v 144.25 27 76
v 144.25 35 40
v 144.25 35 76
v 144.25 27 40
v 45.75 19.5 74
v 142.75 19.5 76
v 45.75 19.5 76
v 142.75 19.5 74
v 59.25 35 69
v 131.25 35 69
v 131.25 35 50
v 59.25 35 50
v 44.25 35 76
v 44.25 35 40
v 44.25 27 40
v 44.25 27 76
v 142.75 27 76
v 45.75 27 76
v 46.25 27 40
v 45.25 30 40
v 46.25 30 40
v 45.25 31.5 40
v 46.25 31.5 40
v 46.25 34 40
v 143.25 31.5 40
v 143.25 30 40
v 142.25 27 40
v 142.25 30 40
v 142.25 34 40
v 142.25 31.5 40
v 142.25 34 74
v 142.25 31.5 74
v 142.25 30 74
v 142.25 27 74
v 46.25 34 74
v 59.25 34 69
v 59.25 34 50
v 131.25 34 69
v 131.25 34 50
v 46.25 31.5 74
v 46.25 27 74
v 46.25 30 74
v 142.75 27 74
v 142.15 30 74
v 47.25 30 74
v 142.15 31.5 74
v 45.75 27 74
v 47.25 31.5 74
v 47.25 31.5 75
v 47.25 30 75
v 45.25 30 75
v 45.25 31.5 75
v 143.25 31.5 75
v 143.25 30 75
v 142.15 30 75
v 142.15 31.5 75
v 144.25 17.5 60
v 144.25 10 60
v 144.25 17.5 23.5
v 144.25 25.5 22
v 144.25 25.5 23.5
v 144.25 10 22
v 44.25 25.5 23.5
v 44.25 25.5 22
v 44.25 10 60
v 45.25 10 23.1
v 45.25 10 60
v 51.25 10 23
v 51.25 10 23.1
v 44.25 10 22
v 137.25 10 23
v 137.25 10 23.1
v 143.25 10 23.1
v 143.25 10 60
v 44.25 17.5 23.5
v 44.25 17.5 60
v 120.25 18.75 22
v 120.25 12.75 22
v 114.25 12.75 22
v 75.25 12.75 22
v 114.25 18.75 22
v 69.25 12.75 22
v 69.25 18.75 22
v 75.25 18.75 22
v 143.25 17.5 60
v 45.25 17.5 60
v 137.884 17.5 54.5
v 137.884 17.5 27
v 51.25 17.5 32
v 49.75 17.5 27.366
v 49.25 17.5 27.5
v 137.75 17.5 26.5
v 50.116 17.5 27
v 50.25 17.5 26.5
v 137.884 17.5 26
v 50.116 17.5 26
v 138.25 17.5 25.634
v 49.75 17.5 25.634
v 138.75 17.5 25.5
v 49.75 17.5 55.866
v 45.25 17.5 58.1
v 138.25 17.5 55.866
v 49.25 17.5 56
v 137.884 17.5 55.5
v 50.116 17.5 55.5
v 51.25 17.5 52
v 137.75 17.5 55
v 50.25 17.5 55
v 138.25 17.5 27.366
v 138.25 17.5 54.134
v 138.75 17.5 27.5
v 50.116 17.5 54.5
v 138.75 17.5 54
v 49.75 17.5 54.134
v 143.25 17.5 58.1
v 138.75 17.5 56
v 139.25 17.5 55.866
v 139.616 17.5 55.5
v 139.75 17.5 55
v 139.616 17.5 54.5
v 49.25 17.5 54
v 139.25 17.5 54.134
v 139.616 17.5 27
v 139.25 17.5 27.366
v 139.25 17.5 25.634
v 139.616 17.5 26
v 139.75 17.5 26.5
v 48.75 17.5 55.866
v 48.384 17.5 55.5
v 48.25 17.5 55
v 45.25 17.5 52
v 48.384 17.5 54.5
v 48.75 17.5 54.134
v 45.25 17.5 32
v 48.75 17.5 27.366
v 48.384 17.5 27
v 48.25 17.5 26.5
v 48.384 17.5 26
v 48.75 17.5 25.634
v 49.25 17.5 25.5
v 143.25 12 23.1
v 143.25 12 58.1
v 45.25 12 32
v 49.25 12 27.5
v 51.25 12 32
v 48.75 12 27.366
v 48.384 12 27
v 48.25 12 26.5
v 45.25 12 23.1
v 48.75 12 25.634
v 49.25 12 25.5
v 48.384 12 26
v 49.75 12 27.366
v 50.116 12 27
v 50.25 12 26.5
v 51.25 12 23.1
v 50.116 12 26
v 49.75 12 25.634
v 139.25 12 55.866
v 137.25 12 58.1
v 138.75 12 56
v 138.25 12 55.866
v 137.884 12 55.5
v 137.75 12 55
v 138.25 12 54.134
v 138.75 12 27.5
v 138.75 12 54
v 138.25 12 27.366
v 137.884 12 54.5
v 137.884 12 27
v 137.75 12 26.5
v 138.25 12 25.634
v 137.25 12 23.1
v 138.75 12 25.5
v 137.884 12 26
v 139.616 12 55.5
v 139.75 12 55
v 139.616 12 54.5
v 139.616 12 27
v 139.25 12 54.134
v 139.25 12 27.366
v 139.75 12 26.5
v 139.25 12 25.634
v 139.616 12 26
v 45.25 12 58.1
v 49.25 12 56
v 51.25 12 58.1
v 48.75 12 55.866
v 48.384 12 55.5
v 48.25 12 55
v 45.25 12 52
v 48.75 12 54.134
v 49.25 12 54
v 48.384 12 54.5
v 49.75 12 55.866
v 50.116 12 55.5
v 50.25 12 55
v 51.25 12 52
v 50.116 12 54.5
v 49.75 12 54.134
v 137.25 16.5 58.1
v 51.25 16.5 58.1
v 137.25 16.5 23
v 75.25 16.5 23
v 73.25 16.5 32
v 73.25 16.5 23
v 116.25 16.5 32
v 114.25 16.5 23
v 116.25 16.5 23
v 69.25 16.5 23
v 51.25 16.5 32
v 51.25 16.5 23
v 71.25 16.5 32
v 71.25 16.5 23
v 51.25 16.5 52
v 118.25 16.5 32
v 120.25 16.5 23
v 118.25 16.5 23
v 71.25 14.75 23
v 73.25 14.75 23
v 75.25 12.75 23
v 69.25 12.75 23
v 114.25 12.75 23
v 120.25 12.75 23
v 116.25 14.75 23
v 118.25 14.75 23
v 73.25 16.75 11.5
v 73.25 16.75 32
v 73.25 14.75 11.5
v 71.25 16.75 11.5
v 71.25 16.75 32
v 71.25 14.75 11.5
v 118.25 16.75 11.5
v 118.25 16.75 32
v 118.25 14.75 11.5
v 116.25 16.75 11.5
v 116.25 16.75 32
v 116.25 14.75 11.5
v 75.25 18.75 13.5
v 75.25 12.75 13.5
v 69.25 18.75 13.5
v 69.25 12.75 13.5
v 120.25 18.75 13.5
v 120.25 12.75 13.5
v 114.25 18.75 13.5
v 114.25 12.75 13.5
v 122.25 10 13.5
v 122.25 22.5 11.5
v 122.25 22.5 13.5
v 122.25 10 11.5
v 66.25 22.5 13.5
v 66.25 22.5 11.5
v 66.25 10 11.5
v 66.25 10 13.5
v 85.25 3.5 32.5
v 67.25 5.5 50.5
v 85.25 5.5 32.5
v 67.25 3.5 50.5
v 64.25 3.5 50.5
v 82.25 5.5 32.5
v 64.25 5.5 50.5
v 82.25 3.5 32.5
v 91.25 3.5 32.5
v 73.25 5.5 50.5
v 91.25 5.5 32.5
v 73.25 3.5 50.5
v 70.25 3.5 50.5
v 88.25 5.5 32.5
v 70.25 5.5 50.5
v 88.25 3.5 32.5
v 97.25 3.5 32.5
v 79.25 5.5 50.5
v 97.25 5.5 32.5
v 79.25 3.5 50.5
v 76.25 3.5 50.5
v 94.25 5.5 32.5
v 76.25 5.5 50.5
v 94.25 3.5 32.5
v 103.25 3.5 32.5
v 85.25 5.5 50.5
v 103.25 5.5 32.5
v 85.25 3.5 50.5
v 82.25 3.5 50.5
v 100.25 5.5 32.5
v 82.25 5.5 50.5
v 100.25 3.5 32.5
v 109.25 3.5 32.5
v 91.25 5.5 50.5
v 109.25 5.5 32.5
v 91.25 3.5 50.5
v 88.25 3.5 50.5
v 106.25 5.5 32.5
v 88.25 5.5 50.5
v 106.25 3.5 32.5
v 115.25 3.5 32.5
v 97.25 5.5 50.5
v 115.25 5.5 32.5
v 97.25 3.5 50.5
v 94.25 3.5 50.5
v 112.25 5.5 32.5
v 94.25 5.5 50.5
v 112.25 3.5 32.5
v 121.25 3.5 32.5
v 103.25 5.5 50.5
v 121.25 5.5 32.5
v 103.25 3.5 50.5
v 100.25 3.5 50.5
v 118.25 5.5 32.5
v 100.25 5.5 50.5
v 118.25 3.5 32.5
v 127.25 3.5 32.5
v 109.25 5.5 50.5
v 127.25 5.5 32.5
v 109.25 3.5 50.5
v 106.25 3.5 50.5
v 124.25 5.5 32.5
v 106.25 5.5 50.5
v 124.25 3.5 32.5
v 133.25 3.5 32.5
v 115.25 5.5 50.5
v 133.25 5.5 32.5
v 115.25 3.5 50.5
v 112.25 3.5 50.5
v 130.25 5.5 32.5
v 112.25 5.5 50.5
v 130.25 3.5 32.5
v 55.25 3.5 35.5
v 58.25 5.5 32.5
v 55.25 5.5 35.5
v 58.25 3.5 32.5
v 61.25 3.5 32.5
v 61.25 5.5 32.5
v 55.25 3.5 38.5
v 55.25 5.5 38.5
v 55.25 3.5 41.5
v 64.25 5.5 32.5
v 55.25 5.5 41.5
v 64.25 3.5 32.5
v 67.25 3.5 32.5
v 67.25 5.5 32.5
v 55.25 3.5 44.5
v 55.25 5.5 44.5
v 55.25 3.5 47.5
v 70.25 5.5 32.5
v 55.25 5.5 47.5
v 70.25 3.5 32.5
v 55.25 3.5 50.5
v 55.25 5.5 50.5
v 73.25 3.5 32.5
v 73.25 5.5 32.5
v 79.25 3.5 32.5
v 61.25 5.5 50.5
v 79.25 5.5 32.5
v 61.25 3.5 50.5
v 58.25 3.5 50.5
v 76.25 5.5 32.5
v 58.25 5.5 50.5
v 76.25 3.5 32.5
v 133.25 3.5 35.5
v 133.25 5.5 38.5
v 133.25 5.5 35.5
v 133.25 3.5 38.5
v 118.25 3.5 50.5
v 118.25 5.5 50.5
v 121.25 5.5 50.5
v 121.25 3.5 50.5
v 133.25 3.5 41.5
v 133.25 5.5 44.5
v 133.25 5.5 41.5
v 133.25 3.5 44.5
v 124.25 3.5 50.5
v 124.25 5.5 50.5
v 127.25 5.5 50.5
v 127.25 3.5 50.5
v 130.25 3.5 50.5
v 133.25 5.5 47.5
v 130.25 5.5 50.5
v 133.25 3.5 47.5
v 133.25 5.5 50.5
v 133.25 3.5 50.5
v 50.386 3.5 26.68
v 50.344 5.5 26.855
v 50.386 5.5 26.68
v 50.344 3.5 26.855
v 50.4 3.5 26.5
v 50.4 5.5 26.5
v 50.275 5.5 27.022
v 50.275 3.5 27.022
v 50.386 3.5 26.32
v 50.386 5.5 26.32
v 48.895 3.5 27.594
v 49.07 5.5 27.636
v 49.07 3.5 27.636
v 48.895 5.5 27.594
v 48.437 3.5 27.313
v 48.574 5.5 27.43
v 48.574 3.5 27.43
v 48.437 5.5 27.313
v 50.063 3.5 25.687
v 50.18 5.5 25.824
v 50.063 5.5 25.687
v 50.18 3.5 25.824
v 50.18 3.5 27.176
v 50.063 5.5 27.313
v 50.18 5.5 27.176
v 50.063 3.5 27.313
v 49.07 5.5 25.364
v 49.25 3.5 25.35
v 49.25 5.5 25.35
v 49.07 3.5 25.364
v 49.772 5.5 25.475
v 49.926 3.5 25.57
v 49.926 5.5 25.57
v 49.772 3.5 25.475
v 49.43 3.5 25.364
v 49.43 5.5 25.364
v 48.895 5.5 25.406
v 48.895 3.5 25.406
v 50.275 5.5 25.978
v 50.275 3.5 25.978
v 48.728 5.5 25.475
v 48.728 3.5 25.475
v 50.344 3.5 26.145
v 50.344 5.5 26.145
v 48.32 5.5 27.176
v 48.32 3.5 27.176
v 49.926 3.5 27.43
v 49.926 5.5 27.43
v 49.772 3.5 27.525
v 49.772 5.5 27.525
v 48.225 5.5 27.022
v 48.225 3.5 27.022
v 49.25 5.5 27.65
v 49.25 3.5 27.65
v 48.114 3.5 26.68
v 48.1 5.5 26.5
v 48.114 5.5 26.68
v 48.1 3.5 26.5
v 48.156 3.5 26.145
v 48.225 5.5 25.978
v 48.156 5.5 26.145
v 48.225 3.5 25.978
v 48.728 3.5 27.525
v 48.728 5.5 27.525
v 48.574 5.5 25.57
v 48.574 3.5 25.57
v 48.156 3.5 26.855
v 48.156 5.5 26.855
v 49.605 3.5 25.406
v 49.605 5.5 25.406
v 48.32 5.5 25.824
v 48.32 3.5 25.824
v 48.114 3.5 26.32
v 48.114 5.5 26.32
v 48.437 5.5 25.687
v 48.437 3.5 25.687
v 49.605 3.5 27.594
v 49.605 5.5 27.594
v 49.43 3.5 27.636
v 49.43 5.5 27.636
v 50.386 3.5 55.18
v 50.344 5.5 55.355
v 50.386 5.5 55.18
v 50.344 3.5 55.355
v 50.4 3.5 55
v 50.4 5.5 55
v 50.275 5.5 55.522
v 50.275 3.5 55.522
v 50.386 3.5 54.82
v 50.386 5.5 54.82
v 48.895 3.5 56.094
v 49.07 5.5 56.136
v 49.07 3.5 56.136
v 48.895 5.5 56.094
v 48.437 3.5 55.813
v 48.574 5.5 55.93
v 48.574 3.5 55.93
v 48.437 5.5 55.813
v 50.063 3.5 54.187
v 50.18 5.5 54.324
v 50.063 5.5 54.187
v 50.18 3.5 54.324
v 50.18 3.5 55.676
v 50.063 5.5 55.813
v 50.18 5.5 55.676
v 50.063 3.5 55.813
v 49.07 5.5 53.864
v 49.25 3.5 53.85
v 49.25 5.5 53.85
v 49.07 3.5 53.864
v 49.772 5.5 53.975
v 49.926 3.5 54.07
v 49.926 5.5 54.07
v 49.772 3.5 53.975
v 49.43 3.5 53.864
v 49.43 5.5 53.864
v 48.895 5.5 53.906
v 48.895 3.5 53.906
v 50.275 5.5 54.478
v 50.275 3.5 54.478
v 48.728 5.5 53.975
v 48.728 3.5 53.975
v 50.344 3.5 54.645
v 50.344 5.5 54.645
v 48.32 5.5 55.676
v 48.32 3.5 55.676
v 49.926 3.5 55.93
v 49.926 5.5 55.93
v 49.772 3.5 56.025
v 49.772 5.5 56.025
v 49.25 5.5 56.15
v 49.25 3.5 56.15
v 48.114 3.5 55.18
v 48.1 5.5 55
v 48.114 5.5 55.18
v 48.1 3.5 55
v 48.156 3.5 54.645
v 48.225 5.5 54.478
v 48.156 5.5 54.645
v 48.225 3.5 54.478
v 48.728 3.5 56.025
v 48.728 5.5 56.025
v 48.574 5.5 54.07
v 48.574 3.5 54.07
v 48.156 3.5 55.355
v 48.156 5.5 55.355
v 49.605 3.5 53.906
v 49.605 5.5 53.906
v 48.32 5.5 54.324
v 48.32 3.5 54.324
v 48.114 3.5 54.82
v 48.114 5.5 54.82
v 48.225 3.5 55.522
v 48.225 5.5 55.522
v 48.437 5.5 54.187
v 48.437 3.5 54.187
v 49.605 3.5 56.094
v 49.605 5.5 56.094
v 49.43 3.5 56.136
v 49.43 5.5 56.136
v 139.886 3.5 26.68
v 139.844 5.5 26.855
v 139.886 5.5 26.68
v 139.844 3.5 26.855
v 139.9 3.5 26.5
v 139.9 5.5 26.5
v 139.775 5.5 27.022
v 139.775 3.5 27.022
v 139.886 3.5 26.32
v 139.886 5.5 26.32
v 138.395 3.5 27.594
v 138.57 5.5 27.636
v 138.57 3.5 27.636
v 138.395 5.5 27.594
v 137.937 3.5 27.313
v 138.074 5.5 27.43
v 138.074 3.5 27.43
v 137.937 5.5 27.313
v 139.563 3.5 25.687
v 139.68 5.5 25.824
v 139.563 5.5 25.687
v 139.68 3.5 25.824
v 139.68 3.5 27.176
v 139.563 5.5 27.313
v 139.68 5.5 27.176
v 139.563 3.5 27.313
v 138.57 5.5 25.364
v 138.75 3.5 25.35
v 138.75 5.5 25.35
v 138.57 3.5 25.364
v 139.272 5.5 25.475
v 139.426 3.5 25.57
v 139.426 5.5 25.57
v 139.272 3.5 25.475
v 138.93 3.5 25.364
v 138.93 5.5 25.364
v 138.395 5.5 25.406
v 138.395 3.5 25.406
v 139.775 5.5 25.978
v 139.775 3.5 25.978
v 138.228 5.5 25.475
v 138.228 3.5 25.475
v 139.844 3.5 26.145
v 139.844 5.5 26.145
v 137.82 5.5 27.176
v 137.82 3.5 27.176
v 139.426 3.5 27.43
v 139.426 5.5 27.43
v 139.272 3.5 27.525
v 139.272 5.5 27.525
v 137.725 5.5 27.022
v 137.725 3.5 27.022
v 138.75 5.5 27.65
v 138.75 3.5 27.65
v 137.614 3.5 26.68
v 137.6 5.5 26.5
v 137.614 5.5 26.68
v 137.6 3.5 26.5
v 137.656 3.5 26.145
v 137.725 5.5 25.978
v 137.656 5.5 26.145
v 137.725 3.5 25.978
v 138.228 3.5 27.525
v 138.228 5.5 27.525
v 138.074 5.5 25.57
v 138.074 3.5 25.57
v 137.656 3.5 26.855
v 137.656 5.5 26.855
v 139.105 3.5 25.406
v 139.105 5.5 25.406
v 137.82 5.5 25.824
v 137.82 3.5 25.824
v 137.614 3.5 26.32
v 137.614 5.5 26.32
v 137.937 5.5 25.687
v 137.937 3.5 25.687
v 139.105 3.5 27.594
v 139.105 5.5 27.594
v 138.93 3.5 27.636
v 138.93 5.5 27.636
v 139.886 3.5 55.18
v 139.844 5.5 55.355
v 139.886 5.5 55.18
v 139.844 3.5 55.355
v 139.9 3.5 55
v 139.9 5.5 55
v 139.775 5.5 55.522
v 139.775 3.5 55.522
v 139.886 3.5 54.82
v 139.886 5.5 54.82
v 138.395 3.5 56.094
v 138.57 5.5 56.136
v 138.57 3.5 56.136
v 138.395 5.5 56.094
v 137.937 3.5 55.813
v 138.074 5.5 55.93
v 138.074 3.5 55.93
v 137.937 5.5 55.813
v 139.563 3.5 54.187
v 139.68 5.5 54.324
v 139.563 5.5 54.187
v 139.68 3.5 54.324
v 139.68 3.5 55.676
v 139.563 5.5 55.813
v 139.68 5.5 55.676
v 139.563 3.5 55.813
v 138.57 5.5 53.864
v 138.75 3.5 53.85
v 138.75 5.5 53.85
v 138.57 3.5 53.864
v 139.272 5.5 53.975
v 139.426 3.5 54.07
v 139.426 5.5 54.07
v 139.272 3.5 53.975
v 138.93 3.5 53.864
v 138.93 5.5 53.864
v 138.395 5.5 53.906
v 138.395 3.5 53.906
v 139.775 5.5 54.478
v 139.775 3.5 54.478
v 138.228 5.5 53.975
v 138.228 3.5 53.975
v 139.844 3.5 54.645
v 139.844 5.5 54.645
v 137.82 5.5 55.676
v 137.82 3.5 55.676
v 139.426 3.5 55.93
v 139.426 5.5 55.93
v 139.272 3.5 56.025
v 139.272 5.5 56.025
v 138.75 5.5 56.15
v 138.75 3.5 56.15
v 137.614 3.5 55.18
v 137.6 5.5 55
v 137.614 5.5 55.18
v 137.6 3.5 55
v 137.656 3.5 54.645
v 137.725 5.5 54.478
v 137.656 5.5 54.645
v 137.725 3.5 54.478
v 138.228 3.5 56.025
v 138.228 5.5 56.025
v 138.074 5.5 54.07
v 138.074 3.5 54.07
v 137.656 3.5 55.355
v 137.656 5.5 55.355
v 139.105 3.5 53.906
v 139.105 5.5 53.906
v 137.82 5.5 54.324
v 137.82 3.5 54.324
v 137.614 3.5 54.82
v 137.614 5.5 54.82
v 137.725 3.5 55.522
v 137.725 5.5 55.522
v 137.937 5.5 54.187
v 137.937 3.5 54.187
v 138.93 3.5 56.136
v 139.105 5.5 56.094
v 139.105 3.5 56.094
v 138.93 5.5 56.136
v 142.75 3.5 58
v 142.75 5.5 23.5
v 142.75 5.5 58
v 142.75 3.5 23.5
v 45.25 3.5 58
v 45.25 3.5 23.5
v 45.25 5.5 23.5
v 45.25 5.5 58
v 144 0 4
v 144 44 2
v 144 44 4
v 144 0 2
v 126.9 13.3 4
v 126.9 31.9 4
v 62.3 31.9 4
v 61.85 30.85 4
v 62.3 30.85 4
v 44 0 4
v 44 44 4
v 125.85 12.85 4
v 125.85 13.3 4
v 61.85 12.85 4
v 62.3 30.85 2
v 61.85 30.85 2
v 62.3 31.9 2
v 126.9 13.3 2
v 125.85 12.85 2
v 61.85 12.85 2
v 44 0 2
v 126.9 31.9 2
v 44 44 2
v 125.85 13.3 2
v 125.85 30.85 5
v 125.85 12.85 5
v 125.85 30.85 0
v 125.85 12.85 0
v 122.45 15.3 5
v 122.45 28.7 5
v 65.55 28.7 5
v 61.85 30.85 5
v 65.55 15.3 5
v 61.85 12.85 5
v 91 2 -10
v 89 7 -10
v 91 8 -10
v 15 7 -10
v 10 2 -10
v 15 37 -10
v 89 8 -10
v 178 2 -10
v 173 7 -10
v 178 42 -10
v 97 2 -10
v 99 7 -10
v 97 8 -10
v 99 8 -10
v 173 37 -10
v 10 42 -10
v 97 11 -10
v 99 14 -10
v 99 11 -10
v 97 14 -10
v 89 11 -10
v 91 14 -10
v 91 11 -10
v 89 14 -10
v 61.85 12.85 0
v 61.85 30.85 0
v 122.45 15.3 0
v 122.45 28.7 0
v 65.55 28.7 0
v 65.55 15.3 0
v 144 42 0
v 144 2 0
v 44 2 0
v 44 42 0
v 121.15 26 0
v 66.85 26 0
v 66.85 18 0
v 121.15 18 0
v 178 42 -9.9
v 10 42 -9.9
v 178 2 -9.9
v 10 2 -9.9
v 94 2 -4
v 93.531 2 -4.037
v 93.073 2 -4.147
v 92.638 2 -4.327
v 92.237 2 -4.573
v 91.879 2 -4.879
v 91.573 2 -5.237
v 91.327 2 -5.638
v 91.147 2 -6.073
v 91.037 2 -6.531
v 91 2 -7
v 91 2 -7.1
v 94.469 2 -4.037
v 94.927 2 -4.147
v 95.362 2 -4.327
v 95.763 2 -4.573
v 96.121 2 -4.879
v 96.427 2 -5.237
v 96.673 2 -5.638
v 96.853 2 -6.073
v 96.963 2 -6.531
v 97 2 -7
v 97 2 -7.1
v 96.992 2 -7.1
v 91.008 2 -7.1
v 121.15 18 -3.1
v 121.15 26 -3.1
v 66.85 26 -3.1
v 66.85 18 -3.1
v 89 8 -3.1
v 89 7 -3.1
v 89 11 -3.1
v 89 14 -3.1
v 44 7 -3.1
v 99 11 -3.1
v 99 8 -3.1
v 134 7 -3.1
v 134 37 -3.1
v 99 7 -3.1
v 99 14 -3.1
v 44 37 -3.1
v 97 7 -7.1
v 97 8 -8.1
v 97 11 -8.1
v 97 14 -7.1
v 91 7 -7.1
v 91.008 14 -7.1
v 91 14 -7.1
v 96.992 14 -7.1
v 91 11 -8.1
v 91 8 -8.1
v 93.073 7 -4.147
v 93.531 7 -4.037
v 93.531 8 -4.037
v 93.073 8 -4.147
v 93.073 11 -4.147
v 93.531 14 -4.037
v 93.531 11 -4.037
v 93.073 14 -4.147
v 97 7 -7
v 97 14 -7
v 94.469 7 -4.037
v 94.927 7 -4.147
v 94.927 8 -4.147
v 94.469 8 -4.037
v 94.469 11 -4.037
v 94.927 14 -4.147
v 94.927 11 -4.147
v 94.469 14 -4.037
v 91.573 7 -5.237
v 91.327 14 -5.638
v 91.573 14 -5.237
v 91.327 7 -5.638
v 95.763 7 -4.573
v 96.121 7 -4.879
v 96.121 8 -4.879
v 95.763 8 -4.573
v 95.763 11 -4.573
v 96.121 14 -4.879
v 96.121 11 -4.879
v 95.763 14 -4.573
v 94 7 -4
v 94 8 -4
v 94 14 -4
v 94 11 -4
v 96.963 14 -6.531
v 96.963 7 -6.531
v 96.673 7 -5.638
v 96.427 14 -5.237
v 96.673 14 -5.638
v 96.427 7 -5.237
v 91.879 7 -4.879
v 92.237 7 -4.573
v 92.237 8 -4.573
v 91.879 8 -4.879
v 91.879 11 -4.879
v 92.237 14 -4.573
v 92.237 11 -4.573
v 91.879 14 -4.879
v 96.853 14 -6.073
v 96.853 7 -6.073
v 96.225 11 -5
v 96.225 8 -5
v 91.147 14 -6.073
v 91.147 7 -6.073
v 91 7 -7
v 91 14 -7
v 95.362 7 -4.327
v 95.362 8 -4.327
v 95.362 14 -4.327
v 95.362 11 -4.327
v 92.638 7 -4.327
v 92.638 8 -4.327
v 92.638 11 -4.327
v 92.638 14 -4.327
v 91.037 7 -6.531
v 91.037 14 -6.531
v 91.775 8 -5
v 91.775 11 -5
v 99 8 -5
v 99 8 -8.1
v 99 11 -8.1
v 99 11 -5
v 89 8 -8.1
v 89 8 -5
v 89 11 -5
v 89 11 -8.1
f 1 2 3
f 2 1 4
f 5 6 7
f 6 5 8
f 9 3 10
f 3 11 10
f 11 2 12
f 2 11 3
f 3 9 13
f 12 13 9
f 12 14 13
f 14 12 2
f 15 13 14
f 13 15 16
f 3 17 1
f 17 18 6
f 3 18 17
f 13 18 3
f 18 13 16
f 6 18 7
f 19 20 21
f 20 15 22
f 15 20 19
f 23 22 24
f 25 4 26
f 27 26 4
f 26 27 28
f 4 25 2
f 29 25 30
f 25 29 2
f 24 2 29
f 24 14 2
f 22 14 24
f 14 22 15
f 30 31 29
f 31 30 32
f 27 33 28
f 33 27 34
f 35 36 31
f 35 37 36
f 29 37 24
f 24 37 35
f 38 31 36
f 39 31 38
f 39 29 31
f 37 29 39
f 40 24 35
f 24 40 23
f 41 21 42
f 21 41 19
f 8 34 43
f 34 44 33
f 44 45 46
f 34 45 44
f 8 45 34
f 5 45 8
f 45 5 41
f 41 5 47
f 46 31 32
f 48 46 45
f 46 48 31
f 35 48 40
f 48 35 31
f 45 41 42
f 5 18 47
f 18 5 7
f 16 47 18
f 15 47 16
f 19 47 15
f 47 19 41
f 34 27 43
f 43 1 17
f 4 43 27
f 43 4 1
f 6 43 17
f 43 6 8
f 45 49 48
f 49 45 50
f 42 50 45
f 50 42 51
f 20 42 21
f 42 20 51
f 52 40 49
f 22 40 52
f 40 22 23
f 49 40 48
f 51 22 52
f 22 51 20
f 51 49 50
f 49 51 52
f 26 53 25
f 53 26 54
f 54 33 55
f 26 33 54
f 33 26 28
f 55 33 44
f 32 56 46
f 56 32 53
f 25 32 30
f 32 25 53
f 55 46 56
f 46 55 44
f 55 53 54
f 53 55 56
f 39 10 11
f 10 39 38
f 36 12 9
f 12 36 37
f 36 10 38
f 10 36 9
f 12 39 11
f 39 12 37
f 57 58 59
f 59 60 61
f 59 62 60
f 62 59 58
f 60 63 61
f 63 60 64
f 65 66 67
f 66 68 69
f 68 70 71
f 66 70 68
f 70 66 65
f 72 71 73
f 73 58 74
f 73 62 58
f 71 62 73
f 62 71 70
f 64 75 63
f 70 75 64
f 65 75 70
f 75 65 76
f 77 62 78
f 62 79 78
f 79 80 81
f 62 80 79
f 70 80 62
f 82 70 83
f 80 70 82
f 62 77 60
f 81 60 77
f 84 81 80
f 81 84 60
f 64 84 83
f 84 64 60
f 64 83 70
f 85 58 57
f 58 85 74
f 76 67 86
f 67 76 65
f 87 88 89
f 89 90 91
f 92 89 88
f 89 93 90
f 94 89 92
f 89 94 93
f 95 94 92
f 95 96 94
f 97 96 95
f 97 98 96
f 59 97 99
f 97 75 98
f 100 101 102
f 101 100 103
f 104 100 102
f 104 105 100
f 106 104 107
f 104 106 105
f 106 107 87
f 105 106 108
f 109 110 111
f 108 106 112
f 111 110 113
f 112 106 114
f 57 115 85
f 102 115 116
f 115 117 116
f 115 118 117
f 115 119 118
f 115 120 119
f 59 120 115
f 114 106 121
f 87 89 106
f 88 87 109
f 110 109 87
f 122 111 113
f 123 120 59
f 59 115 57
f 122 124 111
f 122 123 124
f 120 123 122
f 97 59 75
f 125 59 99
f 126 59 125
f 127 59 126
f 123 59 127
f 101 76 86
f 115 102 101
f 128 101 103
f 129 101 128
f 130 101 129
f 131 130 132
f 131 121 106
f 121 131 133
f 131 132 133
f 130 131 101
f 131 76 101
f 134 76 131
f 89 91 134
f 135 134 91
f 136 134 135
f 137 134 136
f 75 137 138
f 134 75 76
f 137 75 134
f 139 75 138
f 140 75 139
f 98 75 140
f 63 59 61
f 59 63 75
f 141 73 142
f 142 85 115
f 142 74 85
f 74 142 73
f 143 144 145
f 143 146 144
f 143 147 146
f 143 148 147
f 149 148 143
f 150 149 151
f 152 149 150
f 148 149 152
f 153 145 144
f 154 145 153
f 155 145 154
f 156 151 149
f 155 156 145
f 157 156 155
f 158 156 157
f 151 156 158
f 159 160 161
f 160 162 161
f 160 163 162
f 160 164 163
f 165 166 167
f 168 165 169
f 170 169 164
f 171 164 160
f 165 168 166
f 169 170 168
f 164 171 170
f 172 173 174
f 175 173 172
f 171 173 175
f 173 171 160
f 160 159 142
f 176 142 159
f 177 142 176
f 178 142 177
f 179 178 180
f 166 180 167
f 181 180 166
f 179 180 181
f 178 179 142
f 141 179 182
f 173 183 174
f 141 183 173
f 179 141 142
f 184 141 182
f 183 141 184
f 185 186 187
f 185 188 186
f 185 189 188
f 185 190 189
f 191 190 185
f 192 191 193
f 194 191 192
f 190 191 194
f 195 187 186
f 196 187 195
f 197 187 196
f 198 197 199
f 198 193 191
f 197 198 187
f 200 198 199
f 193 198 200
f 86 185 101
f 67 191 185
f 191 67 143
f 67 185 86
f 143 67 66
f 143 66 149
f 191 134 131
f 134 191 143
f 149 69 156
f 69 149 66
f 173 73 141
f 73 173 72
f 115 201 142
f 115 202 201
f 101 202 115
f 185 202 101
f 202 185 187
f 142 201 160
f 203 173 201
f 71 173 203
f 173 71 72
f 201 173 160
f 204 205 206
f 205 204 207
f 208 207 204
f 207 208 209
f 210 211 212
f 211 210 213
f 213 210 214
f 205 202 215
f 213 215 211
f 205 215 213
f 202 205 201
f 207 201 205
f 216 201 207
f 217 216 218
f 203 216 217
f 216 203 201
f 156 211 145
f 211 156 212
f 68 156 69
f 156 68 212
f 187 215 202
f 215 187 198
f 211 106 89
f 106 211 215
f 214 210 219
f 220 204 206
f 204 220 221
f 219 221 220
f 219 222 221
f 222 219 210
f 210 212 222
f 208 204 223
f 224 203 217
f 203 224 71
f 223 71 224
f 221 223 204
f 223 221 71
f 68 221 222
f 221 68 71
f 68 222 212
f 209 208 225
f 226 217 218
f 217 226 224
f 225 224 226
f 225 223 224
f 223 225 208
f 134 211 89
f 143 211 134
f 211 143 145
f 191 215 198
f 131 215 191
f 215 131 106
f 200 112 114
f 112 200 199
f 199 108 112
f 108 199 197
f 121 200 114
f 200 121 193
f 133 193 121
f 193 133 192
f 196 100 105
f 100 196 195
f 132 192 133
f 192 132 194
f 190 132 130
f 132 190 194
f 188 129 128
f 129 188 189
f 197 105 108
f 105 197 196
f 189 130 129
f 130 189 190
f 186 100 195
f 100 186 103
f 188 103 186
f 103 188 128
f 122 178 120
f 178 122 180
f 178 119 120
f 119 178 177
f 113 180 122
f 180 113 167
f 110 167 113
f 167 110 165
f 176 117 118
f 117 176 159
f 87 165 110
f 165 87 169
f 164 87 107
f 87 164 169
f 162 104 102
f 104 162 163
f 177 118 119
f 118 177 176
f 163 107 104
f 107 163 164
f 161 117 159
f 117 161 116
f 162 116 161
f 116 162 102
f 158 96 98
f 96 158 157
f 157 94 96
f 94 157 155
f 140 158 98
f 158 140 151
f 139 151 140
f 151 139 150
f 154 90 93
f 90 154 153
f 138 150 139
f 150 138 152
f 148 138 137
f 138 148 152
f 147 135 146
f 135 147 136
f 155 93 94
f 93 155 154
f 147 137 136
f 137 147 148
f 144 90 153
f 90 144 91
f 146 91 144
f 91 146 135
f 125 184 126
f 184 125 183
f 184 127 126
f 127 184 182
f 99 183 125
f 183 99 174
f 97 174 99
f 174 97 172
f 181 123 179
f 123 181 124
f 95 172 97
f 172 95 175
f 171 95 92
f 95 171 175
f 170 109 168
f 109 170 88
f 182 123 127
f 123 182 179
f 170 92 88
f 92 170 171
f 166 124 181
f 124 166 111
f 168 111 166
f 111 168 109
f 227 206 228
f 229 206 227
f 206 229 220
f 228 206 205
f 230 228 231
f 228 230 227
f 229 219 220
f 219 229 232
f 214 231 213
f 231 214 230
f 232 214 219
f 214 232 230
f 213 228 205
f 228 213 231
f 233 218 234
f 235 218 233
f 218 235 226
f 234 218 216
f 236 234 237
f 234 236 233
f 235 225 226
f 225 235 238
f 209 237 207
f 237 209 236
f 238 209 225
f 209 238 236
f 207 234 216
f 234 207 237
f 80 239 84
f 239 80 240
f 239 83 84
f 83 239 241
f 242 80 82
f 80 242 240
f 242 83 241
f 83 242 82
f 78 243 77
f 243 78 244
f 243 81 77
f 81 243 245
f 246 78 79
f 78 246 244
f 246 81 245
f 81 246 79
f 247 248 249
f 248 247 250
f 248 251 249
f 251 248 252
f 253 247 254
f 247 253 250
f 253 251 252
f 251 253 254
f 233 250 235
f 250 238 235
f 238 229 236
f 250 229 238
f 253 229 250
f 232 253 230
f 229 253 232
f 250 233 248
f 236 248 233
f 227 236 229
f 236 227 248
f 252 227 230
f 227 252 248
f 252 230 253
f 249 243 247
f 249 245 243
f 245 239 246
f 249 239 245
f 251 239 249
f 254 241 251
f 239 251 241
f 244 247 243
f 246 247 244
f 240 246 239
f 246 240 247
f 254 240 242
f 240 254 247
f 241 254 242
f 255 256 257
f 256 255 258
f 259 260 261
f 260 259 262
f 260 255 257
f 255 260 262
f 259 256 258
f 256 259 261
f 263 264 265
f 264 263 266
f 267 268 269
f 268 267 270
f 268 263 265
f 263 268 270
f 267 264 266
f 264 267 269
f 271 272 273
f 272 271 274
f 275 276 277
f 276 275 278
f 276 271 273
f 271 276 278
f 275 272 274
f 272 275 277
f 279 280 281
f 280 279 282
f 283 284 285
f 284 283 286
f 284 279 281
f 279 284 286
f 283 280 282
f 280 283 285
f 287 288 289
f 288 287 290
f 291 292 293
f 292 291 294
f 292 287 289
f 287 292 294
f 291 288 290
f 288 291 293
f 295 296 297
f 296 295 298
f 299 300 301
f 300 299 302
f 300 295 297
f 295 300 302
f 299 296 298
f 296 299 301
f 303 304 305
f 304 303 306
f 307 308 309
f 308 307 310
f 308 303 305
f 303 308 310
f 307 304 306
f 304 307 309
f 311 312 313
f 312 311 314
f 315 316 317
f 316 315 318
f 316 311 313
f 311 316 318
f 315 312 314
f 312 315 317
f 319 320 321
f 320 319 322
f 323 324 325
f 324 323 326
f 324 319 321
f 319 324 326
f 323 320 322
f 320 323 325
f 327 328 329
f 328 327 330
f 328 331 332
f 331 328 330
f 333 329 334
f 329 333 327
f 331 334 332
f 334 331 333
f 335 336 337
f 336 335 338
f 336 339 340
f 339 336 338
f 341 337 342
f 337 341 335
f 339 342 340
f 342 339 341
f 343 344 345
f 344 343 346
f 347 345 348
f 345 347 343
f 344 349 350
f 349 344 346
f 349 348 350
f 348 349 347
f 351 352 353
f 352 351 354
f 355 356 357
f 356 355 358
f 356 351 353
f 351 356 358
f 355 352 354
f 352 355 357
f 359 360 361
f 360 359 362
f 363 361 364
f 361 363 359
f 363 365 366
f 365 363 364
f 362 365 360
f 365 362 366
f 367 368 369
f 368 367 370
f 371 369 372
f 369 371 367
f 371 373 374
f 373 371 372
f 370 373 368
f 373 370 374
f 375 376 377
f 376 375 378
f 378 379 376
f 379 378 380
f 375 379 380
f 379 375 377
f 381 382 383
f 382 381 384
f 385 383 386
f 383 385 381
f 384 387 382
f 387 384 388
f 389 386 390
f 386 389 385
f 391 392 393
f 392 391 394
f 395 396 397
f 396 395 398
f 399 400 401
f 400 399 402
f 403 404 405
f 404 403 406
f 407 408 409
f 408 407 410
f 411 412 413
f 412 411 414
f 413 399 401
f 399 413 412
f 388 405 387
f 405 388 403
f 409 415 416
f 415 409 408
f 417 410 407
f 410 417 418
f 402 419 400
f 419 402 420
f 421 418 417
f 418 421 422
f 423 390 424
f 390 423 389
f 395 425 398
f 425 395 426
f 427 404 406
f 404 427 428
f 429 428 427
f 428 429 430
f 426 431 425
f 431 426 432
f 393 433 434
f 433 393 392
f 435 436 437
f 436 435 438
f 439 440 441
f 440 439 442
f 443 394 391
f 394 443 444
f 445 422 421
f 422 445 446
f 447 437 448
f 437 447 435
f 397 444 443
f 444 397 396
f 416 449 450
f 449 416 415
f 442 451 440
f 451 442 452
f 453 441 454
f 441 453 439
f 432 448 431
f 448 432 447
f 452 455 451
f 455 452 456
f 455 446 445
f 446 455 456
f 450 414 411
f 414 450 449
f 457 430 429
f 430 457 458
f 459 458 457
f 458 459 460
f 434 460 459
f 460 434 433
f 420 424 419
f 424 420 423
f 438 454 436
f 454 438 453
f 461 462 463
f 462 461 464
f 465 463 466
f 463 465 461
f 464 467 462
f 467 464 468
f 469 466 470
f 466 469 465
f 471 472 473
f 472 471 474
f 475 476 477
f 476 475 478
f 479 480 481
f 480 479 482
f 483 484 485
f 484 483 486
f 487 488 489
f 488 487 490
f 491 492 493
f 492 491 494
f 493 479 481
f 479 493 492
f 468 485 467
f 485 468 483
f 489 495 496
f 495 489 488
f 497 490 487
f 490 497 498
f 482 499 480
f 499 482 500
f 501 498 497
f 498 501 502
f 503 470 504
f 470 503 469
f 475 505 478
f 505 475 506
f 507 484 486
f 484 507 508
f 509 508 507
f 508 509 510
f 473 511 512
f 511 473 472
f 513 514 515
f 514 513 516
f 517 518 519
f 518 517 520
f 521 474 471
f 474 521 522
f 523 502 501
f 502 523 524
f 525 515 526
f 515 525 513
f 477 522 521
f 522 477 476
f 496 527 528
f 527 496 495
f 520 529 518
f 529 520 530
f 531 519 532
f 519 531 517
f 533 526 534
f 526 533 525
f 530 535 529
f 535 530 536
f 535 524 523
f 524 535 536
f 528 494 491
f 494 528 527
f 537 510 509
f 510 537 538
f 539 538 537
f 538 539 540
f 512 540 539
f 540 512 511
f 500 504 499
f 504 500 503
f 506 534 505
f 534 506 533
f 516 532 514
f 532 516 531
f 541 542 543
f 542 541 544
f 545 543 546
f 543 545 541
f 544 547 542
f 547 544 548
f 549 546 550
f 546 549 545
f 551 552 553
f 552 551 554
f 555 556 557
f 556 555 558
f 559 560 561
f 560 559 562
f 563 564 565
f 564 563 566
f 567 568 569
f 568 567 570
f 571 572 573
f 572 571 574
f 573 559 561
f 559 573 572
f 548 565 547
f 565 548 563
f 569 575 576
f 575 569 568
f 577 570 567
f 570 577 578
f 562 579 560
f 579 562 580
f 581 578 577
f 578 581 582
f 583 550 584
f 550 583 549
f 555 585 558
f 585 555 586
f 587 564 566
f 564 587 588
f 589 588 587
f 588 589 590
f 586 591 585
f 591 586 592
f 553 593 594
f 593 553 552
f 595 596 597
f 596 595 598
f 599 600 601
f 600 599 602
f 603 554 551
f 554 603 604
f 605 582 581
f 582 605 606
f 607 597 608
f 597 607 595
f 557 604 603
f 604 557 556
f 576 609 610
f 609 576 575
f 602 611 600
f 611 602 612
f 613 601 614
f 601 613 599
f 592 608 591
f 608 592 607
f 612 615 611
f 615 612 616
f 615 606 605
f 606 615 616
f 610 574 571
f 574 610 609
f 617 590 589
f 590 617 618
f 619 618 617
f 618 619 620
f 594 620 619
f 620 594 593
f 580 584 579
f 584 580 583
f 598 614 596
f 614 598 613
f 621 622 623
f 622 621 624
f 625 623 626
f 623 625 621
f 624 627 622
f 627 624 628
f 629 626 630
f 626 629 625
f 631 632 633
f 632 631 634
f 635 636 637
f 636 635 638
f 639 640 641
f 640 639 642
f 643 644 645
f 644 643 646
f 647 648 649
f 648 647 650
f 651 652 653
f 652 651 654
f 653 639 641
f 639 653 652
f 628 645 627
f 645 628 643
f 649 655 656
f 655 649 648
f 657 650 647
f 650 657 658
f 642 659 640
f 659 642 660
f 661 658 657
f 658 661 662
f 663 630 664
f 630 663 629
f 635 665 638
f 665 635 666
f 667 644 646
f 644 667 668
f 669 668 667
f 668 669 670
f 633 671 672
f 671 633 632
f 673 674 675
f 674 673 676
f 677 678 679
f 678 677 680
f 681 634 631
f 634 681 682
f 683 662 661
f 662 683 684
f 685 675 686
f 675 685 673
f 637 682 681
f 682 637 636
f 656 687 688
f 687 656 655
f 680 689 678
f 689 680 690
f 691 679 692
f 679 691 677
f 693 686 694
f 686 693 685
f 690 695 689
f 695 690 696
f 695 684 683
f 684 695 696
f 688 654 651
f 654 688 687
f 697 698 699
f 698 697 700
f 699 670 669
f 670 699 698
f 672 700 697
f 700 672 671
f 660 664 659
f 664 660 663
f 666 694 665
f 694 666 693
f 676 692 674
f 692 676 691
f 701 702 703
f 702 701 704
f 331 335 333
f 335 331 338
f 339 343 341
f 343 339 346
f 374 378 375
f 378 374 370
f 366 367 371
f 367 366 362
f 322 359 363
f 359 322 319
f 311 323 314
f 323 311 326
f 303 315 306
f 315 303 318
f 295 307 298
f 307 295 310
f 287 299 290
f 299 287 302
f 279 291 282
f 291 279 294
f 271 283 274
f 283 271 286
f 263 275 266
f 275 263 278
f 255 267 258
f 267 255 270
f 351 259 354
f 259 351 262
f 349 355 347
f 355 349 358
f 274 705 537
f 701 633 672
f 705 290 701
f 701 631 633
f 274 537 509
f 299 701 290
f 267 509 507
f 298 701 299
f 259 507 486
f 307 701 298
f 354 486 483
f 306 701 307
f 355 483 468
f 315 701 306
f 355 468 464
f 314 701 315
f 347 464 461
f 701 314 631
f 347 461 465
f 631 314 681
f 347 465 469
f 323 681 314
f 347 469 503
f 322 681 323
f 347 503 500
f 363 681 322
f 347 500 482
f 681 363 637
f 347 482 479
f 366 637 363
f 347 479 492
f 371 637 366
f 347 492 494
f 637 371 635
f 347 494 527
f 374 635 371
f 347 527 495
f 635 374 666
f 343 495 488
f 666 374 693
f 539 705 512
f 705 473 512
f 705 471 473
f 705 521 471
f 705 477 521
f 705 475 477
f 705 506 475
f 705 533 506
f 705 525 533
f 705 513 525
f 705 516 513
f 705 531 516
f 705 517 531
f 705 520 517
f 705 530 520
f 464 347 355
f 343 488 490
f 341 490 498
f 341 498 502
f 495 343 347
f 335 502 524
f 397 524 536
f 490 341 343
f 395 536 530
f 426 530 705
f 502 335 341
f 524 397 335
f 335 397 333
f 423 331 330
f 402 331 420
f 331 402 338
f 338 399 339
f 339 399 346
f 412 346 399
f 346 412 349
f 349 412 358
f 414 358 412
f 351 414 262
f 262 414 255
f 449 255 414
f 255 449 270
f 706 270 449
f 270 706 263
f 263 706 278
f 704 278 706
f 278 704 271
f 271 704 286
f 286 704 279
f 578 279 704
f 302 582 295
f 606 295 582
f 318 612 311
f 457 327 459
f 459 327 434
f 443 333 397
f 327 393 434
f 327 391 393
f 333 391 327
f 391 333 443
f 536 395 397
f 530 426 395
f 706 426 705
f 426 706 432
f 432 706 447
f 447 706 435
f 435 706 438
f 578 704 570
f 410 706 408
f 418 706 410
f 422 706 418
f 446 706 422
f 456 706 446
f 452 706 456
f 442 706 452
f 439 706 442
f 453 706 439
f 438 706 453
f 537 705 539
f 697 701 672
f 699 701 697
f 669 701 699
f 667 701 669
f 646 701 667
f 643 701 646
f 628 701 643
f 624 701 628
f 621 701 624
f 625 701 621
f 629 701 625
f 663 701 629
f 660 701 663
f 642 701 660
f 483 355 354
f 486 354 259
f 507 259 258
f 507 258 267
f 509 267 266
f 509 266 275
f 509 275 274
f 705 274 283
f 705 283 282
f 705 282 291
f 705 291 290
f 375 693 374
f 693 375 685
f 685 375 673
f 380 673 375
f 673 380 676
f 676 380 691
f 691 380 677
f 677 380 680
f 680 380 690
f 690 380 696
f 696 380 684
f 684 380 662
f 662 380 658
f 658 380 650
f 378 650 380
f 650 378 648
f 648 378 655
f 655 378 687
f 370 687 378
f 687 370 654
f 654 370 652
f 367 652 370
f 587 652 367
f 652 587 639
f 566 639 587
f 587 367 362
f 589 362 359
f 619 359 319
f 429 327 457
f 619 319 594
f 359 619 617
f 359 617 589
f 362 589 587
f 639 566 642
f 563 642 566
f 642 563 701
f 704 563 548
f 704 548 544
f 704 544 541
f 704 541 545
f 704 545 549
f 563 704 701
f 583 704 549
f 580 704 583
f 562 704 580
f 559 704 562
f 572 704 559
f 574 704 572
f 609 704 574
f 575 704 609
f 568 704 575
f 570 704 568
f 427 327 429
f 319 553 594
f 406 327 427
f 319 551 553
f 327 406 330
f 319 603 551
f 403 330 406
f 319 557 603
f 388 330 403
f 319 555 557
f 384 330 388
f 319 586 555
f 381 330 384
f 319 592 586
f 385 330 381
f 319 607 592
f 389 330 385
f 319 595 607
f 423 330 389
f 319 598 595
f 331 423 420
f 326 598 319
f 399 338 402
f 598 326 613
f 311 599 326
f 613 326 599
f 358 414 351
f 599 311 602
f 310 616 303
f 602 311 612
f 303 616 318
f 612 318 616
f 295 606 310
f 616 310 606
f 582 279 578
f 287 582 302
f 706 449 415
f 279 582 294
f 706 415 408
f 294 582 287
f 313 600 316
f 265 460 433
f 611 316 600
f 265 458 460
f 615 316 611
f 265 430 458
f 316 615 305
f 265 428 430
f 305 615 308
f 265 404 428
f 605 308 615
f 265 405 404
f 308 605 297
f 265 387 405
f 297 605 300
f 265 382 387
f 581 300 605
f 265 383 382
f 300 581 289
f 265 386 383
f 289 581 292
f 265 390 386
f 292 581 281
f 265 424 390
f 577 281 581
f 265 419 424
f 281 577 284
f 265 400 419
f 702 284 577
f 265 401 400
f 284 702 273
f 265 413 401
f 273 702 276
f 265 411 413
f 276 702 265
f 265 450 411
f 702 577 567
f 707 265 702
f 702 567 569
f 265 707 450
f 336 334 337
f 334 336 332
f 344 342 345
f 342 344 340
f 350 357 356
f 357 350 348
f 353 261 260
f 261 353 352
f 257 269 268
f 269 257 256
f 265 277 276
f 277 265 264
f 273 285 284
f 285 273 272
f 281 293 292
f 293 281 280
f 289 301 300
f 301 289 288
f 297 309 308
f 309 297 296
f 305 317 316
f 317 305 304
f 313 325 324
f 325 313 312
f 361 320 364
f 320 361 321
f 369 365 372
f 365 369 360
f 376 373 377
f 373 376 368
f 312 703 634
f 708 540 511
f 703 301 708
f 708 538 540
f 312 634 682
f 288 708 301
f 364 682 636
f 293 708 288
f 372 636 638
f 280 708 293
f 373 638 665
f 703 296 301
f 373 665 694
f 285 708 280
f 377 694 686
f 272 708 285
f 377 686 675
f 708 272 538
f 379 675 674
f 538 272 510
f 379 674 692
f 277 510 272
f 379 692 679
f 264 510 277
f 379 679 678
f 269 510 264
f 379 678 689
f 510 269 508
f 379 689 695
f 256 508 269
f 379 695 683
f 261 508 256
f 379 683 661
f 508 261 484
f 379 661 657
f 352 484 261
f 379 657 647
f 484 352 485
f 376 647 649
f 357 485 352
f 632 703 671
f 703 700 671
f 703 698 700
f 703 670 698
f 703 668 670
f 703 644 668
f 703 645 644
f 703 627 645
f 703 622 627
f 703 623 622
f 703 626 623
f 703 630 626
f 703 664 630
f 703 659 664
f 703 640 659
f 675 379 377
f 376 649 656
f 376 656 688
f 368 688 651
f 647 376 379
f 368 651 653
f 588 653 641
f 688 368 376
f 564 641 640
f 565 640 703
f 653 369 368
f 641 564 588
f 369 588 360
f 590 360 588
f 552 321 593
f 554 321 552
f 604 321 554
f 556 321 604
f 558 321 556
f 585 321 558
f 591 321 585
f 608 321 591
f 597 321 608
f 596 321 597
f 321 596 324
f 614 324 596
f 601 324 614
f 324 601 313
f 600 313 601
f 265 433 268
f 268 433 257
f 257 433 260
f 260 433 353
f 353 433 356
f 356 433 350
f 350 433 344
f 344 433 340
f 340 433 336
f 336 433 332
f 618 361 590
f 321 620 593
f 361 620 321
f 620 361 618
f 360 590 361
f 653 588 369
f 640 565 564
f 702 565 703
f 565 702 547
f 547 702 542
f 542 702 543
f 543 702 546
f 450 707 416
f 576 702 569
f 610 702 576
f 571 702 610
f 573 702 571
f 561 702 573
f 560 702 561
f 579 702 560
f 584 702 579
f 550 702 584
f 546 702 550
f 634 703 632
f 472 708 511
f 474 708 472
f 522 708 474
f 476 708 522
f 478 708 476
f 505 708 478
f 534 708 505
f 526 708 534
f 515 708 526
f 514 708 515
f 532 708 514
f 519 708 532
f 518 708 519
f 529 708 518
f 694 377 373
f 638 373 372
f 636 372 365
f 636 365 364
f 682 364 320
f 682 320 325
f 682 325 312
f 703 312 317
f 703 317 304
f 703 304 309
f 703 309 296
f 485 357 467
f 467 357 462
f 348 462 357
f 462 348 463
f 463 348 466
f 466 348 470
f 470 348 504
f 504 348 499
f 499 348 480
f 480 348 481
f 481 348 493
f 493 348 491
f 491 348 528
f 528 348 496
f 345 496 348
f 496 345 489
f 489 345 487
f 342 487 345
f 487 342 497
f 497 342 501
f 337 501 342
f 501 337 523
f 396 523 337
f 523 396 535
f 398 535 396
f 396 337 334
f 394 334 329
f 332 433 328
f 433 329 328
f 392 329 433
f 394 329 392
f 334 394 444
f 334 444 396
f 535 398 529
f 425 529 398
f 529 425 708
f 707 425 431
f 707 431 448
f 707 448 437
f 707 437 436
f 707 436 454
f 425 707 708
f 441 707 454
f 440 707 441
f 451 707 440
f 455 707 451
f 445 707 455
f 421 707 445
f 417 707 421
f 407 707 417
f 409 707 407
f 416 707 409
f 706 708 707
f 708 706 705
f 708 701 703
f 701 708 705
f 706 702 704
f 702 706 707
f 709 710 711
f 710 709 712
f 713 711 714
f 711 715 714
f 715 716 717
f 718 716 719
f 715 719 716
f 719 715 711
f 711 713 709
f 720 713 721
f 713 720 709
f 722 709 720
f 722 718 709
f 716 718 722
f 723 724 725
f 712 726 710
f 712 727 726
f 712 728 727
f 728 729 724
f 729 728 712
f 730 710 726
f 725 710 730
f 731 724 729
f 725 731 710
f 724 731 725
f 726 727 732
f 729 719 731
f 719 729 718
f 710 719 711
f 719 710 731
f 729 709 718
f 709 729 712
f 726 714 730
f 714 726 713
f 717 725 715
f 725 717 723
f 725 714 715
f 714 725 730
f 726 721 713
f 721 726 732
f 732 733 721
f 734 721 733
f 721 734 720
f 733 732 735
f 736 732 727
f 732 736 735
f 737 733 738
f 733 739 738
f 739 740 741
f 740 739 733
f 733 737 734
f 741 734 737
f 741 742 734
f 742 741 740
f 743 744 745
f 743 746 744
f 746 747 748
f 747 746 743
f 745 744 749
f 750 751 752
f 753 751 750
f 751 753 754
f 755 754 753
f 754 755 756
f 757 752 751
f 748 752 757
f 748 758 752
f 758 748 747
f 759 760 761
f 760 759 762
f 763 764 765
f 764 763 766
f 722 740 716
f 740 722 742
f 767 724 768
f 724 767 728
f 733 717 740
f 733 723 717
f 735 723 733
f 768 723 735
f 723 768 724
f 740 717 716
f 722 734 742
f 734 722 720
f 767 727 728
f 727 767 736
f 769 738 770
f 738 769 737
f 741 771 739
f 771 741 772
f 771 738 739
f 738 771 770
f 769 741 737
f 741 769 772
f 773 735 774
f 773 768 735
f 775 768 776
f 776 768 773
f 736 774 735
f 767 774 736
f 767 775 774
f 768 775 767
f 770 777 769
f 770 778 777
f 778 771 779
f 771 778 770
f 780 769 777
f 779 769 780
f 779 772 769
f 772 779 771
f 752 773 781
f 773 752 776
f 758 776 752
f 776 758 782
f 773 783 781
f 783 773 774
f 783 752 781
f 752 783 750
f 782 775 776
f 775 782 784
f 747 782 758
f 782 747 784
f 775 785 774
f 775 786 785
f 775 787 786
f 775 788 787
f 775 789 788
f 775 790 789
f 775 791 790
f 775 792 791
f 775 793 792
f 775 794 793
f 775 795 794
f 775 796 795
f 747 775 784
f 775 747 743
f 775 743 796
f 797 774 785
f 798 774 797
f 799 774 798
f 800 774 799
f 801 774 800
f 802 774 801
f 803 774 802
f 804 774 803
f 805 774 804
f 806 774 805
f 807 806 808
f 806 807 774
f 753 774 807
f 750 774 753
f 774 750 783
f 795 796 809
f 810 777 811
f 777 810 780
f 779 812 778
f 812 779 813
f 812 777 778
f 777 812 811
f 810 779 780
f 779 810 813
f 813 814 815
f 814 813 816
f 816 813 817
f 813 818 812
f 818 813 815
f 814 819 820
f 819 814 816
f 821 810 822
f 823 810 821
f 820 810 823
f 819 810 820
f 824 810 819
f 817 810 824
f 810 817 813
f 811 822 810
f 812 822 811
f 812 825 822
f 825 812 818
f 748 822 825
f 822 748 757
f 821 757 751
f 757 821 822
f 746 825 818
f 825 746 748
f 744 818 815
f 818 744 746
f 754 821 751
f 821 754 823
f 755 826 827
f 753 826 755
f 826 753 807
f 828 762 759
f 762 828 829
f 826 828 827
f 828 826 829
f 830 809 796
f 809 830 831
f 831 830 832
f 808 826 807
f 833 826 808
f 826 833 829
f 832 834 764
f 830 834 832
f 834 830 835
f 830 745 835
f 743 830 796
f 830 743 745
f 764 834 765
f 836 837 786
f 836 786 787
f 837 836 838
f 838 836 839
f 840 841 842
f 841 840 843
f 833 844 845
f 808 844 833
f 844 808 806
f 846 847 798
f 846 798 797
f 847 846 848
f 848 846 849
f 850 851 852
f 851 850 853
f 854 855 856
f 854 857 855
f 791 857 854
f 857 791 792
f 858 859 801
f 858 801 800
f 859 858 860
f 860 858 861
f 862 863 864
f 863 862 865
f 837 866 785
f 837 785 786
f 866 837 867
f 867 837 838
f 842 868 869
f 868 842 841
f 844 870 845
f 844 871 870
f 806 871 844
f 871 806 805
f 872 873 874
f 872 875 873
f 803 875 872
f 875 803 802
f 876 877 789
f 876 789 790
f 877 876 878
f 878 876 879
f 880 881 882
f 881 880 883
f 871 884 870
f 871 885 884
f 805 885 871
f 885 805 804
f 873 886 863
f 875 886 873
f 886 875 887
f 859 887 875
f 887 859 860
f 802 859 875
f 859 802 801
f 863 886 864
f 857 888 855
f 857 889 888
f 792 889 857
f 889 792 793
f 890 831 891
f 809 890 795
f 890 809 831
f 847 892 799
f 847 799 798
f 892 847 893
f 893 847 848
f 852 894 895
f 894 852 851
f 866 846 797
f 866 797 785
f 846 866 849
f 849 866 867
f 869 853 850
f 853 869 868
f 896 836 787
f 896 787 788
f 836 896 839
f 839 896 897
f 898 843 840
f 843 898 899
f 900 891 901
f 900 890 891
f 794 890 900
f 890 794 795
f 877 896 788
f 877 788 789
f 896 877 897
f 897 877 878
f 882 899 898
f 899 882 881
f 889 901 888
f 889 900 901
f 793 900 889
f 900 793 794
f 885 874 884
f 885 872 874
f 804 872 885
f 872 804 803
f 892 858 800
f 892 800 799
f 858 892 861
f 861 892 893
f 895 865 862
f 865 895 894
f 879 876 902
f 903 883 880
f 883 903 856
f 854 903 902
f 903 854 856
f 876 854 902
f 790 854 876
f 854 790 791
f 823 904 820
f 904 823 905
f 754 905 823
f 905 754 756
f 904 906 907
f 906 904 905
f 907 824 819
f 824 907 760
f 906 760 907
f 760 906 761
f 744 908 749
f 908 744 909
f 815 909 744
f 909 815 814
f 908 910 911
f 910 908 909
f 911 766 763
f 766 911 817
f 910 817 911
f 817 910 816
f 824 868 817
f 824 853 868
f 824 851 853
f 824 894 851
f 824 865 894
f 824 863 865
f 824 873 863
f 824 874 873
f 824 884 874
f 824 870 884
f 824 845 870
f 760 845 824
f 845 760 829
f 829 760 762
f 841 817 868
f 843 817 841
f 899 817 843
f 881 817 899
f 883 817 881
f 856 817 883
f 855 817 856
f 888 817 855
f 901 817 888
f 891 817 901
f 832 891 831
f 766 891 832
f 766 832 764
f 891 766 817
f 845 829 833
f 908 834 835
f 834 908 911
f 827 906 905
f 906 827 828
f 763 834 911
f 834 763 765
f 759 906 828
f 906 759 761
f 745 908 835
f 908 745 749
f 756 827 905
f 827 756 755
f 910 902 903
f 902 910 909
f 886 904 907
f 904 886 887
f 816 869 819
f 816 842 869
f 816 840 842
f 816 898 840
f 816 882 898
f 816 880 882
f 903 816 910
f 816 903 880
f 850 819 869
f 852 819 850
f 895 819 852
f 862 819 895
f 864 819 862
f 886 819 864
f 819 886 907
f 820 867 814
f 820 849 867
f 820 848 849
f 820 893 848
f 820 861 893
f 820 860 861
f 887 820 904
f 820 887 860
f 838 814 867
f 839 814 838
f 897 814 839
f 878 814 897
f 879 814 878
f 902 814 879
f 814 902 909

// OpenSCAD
// file: Train Platform.scad
//Train platform for Train Display Case

view_part = 0; //[0:top,1:base]


/* [Hidden] */
pa = 0.3;
cd = 0.1; //small value to ensure holes are through
station_ramp_x = 168;
station_ramp_y = 40;
station_ramp_z = 10;
centre_flat_x = 100;
centre_flat_y = 43;

flat_offset_x = (station_ramp_x - centre_flat_x)/2;

top_z = 2;
top_x = 100;
top_y = 44;
display_base_x = 56+pa;
display_base_y = 12.5+pa;

gutter_x = 64+pa;//surround for bottom
gutter_y = 18+pa;
gutter_z = 5;
gutter_off_x = (station_ramp_x - gutter_x)/2;
gutter_off_y = (station_ramp_y - gutter_y)/2;
gutter_wall_x = (gutter_x-display_base_x-2*pa)/2;
gutter_wall_y = (gutter_y-display_base_y-2*pa)/2;
top_offset_x = top_x/2 - (gutter_x - 3*pa)/2;
top_offset_y = top_y/2 - (gutter_y - 3*pa)/2;


cable_slot_x = display_base_x-2;//some value
cable_slot_y = 8;
exit_slot_x = 6;
exit_slot_z = 6;
exit_slot_y = 20;


if (view_part == 0 ) top ();
    
if (view_part == 1 ) ramped_base ();
    
module ramped_base () {
    difference () {
        union () {
            hull () {
                cube ([station_ramp_x,station_ramp_y,cd]);
                
                translate ([flat_offset_x,0,0])
                    cube ([centre_flat_x,station_ramp_y,station_ramp_z]);
            }//end hull
            translate ([gutter_off_x,gutter_off_y,0])
            hollow_gutter ();
        }//end union
        
        //through cable slot
        translate ([station_ramp_x/2-cable_slot_x/2,station_ramp_y/2-cable_slot_y/2,-cd])
            cube ([cable_slot_x,cable_slot_y,20]);
        //hollow_out base
        
        hull () {
                translate ([5,5,-cd]) cube ([station_ramp_x-10,station_ramp_y-10,cd]);
                
                translate ([flat_offset_x,5,-cd])
                    cube ([centre_flat_x-10,station_ramp_y-10,station_ramp_z-3]);
            }//end hull
            
        //wall cable_slot
            translate ([station_ramp_x/2-3,-cd,-cd])
                cube ([6,10,3]);
            translate ([station_ramp_x/2,-cd,3]) rotate ([-90,0,0])
                cylinder (d=6,h=10,$fn=40);
    
    }//end diff
    //add cable tie slots to cube 
    difference () {
    translate ([station_ramp_x/2-5,0,0])
                cube ([10,12,10]);
        translate ([station_ramp_x/2-3,-cd,-cd])
                cube ([6,13,3]);
            translate ([station_ramp_x/2,-cd,3]) rotate ([-90,0,0])
                cylinder (d=6,h=13,$fn=40);
        translate ([station_ramp_x/2-6,6,-cd])
            cube ([15,3,2]);
        translate ([station_ramp_x/2-6,6,5])
            cube ([15,3,2]);
    }//end diff
}//end module

module hollow_gutter () {
    difference () {
        cube ([gutter_x-pa,gutter_y-pa,station_ramp_z+gutter_z]);
        
        translate ([gutter_wall_x,gutter_wall_y,-cd])
            cube ([gutter_x-2*gutter_wall_x,gutter_y-2*gutter_wall_y,station_ramp_z+gutter_z+2]);
        
    }//end diff
    
}// end module
    

module top () {
    difference () {
    cube ([top_x,top_y,top_z]);
    translate ([top_offset_x,top_offset_y,-cd])
        cube ([gutter_x+pa,gutter_y+pa,gutter_z]);
    }//end diff
}
// file: Train Display Case.scad
/*
Revisions by rogerw-gh to make case and display building easier.
*/
view_part = 0; //[0:front,1:frame]

/* [Hidden] */

$fa = 1;
$fs = 0.4;
cd =0.1;
pa = 0.3;
front_x = 100;
front_y = 38;
front_z = 15.5;
back_x = 97.5;
back_y = 34.5;
screw_hole_x = 4;
screw_hole_y = 3;
hole_x_pitch = back_x - 2*screw_hole_x;
hole_y_pitch = back_y - 2*screw_hole_y;
screw_hole_dia = 2+pa;
bolt_round = 40;


if (view_part == 0 ) new_front ();
    
if (view_part == 1 ) new_frame ();
    
module frame_legs () {
    difference () {
       union () {
           //two legs
        translate ([25,front_y-1,front_z/2-5])
            cube ([6,10,6]);
        translate ([70,front_y-1,front_z/2-5])
            cube ([6,10,6]);
           //base
        translate ([22,front_y+8.5,0])
            cube ([56,2,front_z-3]);
        }//end union 
        translate ([27,front_y-2,front_z/2-3])
            cube ([2,15,2]);
        translate ([72,front_y-2,front_z/2-3])
            cube ([2,15,2]);
    }//
    //absolute positioning 
    
    
}//end module
    
module new_frame () {
    difference () {
        cube ([front_x,front_y,front_z]);
        //back
        translate ([-cd*2,-cd,7.5]) cube([110,front_y-1.5+cd,20]);
        
        //shallow recess in back
        translate ([1,-cd,-cd]) cube([front_x-2,37,2+cd]);
        //create flange in back
        translate ([1,-cd,-cd]) cube([front_x-2,2,12+cd]);
        //create end steps for back to screw into
        translate ([7,-cd,-cd]) cube([front_x-14,37.1,6.5+cd]);
        //slot
        translate ([1,8,-cd]) cube([6,20,12+cd]);
        //slot tidy up
        translate ([1,8,-cd]) cube([8,20,6.5+cd]);
        //holes 
        translate([screw_hole_x+1,screw_hole_y+2,-cd])
            cylinder (d=2,h=10,$fn=12);
        
        translate([1+hole_x_pitch+screw_hole_x,screw_hole_y+2,-cd])
            cylinder (d=2,h=10,$fn=12);
        
        translate([1+screw_hole_x,screw_hole_y+2+hole_y_pitch,-cd])
            cylinder (d=2,h=10,$fn=12);
        translate([1+hole_x_pitch+screw_hole_x,screw_hole_y+2+hole_y_pitch,-cd])
            cylinder (d=2,h=10,$fn=12);
         
         //cable_holes
                translate ([27,front_y-10,front_z/2-3])
        cube ([2,15,2]);
                translate ([72,front_y-10,front_z/2-3])
        cube ([2,15,2]);
    }//end diff
    frame_legs ();
}//end module



module new_front () {
    top_thick = 2;
    difference () {
        cube ([front_x,front_y-top_thick,front_z]);
        
        translate ([2,-cd,1])
            cube ([96,front_y-2-top_thick+cd,20]);//remove inner
        
        //small LH cutout
        translate ([-cd,-cd,8])
            cube ([1.5+cd,front_y+1+cd,10]);//LH end cleanup
        //make inside flush
        translate ([-cd,-cd,8])
            cube ([5,front_y-2-top_thick+cd,10]);//LH end cleanup
        
        //small RH cutout
        translate ([98.5,-cd,8])
            cube ([1.5+cd,front_y+1+cd,10]);//RH end cleanup
        //make inside flush
        translate ([97,-cd,8])
            cube ([5,front_y-2-top_thick+cd,10]);//RH end cleanup
        
        //board slots
        
        translate ([1,-cd,3.5])
            cube([2,front_y-3+cd,1.5]);
        translate ([98-cd,-cd,3.5])
            cube([1+cd,front_y-3+cd,1.5]);
            
        //front display window
        translate ([15,10,-cd])
            cube ([72,19,5]);      
        
    }//end diff
}//end module

module old_front () {
difference(){
    cube([105,2,39]);
    translate([16.95,-1,11.34])
        cube([71.10,4,19.26]);//first make difference work properly by offsetting the cube into Y and making the cube cut right through the panel.
}
rotate([270,0,0])
    translate([5.25,-5,2])
        cylinder(h=6,r=1.5);
rotate([270,0,0])
    translate([5.25,,-34,2])
        cylinder(h=6,r=1.5);
rotate([270,0,0])
    translate([99.25,-5,2])
        cylinder(h=6,r=1.5);
rotate([270,0,0])
    translate([99.25,-34,2])
        cylinder(h=6,r=1.5);

}//end module
// main file
//build exploded version

use <Train Display Case.scad>
use <Train Display Case Back.scad>
use <Train Platform.scad>

translate ([44.25,35,40]) color ("green") rotate ([90,0,0]) new_front ();
//translate ([40,15,8]) 
translate ([44.25,10,60]) rotate ([-90,0,0]) color ("orange")new_frame ();


//test back fit 
//translate ([41.25,16.5,23.5]) rotate ([90,0,0]) new_back ();
//OR
translate ([45.25,5.5,23.5]) color ("teal") rotate ([90,0,0]) new_back ();

translate ([44,0,2]) color("red") top ();

translate ([10,2,-10]) color("grey") ramped_base ();
